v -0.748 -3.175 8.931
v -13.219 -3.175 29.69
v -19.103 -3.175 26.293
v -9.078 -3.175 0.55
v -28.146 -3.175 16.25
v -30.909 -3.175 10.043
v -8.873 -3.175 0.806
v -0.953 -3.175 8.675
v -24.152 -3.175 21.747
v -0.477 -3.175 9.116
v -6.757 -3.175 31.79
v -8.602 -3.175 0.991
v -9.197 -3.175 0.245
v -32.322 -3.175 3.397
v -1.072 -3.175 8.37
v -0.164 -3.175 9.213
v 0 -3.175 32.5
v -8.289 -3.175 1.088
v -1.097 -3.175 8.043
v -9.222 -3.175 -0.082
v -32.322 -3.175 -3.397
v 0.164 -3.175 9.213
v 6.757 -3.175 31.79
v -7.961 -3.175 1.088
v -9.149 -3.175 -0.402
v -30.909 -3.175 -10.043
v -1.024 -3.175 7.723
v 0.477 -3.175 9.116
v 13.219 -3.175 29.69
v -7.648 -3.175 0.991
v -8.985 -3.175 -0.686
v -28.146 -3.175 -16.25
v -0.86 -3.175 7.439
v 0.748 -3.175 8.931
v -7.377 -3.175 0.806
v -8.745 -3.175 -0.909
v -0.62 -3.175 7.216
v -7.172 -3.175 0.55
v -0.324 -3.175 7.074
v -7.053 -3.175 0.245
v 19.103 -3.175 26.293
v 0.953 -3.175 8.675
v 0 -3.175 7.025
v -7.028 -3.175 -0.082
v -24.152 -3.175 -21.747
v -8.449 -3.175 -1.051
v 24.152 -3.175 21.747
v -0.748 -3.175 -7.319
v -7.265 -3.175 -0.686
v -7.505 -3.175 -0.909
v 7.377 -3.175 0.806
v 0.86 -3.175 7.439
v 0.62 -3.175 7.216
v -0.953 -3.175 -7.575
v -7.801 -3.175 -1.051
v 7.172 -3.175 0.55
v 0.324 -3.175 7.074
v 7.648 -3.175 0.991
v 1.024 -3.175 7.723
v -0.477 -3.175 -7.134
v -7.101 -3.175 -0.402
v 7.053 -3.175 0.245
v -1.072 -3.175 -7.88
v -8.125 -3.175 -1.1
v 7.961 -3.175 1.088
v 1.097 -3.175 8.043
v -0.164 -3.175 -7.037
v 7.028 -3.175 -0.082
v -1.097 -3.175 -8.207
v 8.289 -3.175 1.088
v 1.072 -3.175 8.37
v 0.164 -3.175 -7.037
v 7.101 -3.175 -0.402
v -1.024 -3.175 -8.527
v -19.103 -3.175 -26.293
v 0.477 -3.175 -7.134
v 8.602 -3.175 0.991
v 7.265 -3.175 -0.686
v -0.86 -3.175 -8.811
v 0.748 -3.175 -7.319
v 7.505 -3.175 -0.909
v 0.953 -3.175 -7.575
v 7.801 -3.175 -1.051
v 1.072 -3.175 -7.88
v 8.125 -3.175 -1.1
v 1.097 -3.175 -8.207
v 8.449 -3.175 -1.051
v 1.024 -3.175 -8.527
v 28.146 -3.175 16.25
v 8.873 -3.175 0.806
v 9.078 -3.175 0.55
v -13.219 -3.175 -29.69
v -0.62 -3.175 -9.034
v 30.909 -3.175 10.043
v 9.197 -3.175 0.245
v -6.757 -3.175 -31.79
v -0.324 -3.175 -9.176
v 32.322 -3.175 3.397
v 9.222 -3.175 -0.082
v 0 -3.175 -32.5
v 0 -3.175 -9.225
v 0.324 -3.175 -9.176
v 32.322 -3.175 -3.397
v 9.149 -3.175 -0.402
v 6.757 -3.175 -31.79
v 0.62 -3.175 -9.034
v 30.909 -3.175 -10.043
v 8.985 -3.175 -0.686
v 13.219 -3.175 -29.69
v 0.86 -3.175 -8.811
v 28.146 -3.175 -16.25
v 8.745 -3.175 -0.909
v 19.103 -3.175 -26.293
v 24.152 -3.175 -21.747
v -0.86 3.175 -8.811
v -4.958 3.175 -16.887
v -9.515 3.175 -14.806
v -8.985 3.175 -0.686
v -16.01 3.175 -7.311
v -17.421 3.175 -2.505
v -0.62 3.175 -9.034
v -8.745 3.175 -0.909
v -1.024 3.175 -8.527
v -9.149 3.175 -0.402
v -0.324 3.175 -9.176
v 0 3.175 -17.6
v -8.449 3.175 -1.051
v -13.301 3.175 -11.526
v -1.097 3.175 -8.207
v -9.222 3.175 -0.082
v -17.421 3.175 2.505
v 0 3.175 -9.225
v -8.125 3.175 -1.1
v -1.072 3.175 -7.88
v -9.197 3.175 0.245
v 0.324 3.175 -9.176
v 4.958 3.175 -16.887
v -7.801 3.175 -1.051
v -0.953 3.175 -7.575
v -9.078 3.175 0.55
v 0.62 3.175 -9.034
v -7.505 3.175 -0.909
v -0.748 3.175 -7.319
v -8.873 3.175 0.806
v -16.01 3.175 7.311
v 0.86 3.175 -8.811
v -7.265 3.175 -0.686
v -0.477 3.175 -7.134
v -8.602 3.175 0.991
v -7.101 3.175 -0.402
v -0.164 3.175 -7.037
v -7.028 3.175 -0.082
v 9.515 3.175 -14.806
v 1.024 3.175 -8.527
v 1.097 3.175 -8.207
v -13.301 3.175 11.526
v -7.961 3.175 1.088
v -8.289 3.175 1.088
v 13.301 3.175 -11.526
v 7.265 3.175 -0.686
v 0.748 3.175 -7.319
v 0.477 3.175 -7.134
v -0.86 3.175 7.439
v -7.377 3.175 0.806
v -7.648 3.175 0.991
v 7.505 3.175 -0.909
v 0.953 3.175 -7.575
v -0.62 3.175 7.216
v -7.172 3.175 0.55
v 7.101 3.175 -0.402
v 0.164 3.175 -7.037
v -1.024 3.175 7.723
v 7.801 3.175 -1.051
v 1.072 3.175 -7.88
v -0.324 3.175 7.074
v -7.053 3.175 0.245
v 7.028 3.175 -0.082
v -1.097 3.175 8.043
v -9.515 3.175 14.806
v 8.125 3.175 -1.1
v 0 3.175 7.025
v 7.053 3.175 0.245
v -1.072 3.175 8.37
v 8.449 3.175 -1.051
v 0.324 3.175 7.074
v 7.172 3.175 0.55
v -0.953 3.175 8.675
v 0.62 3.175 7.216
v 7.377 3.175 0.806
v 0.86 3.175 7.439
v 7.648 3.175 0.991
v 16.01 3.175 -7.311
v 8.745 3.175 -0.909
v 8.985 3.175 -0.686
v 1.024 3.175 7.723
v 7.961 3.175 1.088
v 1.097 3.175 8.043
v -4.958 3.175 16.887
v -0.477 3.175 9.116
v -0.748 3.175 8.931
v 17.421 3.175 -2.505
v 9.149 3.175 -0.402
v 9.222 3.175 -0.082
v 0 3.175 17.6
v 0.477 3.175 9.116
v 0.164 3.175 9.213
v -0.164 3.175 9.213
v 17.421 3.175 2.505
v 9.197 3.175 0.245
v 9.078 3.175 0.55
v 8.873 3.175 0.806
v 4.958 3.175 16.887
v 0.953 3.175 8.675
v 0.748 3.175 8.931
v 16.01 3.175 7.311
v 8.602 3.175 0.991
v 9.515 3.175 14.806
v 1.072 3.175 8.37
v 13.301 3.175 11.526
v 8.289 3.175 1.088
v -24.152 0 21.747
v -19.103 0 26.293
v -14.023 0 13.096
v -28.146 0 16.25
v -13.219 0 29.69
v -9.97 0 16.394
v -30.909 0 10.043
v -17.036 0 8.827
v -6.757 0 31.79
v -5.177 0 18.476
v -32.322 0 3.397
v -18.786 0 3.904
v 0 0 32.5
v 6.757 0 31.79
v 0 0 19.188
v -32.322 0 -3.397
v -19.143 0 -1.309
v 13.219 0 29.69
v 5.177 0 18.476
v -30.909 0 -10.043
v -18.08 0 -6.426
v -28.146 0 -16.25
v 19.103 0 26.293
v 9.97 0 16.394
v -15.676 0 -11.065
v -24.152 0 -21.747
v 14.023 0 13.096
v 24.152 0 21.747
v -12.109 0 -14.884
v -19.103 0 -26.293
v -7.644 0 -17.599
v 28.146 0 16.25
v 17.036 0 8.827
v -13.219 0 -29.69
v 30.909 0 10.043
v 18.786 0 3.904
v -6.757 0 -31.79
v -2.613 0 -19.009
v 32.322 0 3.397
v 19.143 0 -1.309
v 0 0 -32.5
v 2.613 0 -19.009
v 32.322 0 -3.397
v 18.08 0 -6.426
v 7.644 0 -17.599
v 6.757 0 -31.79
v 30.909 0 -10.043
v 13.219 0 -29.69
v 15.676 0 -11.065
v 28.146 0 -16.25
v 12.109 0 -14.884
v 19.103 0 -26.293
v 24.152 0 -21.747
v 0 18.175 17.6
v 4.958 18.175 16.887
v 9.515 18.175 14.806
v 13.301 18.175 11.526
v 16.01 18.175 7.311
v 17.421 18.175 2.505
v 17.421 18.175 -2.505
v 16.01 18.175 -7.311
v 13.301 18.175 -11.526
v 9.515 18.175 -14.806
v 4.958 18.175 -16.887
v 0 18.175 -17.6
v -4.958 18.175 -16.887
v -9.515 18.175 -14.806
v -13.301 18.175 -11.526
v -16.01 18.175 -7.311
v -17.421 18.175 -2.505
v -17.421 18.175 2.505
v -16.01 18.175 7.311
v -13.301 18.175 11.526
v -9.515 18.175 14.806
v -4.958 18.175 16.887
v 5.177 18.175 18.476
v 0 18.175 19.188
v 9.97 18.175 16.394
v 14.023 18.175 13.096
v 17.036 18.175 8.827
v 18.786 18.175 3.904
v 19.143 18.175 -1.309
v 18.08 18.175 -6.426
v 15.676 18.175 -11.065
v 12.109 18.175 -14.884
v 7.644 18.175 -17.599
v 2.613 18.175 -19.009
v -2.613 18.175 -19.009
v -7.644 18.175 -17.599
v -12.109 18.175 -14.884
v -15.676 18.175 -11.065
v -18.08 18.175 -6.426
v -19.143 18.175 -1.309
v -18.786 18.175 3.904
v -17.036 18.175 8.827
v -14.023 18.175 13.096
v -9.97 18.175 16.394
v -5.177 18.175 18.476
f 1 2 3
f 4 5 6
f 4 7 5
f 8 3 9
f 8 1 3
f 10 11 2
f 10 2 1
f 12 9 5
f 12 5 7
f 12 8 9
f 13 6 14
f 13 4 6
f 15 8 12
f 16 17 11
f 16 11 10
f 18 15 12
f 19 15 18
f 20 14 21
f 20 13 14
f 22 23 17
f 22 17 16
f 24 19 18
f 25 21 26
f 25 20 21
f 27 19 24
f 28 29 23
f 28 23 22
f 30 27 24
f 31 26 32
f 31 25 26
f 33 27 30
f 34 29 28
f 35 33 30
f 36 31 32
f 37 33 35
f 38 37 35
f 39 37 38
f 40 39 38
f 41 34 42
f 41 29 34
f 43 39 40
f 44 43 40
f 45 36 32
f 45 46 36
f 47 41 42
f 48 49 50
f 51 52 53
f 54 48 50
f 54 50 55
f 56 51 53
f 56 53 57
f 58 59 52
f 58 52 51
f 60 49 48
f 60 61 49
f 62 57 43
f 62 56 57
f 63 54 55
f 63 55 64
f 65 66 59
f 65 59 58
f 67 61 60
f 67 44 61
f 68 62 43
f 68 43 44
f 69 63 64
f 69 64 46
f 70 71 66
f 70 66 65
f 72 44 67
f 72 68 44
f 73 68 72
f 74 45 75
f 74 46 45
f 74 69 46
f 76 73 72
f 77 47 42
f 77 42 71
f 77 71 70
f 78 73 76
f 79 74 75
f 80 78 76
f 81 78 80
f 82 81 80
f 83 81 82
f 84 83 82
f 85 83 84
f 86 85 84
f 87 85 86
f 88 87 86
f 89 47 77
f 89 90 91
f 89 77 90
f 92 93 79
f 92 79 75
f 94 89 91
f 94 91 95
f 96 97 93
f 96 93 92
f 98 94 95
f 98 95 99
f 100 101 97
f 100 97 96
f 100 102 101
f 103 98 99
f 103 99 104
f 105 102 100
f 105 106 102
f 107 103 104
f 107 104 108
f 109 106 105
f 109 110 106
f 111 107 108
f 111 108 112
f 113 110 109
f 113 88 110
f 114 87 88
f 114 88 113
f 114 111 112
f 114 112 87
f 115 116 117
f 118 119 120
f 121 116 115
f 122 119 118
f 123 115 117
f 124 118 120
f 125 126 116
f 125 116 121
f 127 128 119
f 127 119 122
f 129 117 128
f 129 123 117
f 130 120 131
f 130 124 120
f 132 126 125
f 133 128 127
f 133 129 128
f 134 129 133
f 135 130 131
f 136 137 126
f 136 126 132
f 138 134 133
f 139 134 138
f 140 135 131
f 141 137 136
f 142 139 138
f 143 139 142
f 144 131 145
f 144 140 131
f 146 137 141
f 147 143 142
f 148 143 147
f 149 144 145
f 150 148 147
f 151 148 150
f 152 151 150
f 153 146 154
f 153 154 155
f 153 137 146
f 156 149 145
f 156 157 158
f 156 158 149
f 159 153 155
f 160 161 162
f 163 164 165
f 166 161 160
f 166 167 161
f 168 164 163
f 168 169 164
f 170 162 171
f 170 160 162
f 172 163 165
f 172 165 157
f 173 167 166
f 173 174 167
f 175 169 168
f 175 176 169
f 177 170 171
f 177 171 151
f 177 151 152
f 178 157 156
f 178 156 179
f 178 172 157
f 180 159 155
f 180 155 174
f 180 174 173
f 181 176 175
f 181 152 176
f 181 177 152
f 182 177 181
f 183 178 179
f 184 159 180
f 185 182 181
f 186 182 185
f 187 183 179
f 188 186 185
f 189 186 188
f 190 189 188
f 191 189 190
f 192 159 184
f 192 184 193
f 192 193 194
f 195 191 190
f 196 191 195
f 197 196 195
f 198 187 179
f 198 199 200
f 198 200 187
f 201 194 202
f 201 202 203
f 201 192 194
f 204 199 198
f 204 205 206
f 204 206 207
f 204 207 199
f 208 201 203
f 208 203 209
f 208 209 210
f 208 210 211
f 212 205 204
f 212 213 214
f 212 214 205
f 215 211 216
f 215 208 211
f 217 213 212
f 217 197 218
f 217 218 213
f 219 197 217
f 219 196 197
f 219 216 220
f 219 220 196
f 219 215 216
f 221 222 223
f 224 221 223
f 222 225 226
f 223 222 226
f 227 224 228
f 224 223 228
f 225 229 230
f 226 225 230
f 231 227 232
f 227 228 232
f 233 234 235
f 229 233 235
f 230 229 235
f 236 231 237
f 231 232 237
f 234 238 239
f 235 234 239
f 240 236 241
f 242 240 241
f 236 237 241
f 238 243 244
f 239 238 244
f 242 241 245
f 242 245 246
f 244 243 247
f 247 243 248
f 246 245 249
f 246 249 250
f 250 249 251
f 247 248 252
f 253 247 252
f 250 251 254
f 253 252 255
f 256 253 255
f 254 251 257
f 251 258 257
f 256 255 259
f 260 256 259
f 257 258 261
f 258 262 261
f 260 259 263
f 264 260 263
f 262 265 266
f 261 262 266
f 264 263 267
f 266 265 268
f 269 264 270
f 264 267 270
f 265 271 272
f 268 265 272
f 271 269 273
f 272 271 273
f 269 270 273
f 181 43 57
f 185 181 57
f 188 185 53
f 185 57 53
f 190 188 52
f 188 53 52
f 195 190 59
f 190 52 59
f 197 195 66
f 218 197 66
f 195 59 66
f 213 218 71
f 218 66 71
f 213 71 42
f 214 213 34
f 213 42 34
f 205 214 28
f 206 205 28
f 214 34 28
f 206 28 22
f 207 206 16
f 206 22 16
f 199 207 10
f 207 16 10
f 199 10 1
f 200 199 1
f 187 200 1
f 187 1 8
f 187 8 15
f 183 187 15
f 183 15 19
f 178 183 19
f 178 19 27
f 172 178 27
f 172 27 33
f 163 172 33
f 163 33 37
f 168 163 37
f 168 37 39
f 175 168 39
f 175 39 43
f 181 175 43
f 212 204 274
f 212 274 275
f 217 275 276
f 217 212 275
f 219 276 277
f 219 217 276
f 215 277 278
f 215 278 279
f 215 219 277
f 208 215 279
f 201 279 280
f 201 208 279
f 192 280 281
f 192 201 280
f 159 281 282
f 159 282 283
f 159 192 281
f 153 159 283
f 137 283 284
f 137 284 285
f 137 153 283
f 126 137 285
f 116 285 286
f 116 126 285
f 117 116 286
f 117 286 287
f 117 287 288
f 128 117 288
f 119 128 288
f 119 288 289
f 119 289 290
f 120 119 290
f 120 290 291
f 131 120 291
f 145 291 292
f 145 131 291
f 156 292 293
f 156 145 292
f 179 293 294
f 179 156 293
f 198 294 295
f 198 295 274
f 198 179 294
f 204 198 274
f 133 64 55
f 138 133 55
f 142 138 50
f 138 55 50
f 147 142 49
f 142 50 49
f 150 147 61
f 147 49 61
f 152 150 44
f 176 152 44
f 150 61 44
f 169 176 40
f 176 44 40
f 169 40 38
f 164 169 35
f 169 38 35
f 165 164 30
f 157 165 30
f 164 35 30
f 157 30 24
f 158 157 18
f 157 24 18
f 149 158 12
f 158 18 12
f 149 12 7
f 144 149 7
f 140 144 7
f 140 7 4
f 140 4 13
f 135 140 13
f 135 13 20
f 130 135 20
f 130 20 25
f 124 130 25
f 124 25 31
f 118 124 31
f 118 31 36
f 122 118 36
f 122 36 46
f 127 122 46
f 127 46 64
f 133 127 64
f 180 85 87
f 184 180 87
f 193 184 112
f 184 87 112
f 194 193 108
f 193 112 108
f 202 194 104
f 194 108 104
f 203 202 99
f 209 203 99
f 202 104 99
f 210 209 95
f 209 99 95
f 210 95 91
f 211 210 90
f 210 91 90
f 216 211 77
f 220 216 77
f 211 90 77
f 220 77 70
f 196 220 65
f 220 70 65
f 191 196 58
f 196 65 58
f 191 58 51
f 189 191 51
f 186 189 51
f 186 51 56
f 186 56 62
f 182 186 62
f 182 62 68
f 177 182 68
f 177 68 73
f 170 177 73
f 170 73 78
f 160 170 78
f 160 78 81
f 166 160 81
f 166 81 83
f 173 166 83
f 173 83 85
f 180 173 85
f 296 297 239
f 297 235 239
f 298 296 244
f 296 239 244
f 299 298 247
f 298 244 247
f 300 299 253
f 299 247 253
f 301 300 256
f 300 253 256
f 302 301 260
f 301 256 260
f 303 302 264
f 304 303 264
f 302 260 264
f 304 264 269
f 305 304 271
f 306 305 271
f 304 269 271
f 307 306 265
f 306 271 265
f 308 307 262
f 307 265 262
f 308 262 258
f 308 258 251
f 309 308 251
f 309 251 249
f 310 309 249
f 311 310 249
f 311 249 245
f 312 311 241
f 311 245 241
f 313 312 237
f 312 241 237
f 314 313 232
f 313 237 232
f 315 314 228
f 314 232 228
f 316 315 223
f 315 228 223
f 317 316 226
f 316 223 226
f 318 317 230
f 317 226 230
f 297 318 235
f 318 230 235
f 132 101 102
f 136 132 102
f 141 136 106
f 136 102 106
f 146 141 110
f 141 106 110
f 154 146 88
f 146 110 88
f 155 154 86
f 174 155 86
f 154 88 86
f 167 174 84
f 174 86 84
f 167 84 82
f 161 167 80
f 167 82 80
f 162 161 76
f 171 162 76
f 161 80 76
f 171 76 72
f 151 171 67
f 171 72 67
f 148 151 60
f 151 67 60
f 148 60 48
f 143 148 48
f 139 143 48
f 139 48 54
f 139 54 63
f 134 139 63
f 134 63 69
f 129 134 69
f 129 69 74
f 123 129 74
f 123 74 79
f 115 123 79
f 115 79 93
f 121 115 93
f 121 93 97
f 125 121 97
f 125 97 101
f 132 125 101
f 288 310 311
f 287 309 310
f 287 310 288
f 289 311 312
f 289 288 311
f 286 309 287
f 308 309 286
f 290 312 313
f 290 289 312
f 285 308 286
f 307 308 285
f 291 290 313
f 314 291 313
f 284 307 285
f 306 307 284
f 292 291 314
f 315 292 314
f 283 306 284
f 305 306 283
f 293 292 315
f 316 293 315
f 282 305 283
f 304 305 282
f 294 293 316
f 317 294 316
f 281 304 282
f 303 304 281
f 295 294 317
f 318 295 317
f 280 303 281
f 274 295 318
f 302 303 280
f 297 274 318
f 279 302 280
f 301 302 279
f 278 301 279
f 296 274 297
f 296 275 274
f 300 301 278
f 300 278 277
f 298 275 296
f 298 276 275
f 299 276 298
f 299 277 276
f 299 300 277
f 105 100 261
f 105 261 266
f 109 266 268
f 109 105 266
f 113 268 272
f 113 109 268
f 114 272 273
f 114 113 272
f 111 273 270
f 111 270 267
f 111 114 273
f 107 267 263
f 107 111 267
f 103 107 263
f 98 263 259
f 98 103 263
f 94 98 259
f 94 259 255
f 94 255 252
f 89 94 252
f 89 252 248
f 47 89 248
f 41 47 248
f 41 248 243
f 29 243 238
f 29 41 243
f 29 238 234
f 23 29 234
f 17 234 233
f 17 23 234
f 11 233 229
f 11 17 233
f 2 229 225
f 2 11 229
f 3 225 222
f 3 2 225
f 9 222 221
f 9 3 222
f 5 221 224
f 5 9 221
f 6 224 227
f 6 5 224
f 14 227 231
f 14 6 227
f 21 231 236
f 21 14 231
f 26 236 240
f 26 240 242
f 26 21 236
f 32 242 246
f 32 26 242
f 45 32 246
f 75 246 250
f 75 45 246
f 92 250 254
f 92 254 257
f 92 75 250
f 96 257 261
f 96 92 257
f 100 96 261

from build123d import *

# Parameters (mm, degrees)
SKETCH1_R           = 19.1875
BOSS_EXTRUDE1_DEPTH = 3.175
SKETCH2_R           = 19.1875
SKETCH2_R_2         = 17.6
BOSS_EXTRUDE2_DEPTH = 15
SKETCH3_R           = 1.1
CUT_EXTRUDE1_DEPTH  = 33.659622434
BOSS_EXTRUDE3_START = 3.175
SKETCH4_R           = 32.5
SKETCH4_R_2         = 1.1
BOSS_EXTRUDE3_DEPTH = 3.175


with BuildPart() as part:
    # Sketch1 → Boss-Extrude1 (new body)
    with BuildSketch(Plane(origin=(0, 0, 0), x_dir=(1, 0, 0), z_dir=(0, 1, 0))):
        with Locations(Location((0, 0, 0), (0, 0, 270))):
            Circle(SKETCH1_R)
    extrude(amount=BOSS_EXTRUDE1_DEPTH)

    # Sketch2 → Boss-Extrude2 (add)
    with BuildSketch(Plane(origin=(0, 3.175, 0), x_dir=(1, 0, 0), z_dir=(0, 1, 0))):
        with Locations(Location((0, 0, 0), (0, 0, 270))):
            Circle(SKETCH2_R)
        with Locations(Location((0, 0, 0), (0, 0, 270))):
            Circle(SKETCH2_R_2, mode=Mode.SUBTRACT)
    extrude(amount=BOSS_EXTRUDE2_DEPTH)

    # Sketch3 → Cut-Extrude1 (cut, through all)
    with BuildSketch(Plane.XZ):
        with Locations(Location((0, 8.125, 0), (0, 0, 270))):
            Circle(SKETCH3_R)
        with Locations(Location((8.125, 0, 0), (0, 0, 270))):
            Circle(SKETCH3_R)
        with Locations(Location((-8.125, 0, 0), (0, 0, 270))):
            Circle(SKETCH3_R)
        with Locations(Location((0, -8.125, 0), (0, 0, 270))):
            Circle(SKETCH3_R)
    extrude(amount=-CUT_EXTRUDE1_DEPTH, mode=Mode.SUBTRACT)

    # Sketch4 → Boss-Extrude3 (add)
    with BuildSketch(Plane.XZ.offset(BOSS_EXTRUDE3_START)):
        with Locations(Location((0, 0, 0), (0, 0, 270))):
            Circle(SKETCH4_R)
        with Locations(Location((0, -8.125, 0), (0, 0, 270))):
            Circle(SKETCH4_R_2, mode=Mode.SUBTRACT)
        with Locations(Location((8.125, 0, 0), (0, 0, 270))):
            Circle(SKETCH4_R_2, mode=Mode.SUBTRACT)
        with Locations(Location((-8.125, 0, 0), (0, 0, 270))):
            Circle(SKETCH4_R_2, mode=Mode.SUBTRACT)
        with Locations(Location((0, 8.125, 0), (0, 0, 270))):
            Circle(SKETCH4_R_2, mode=Mode.SUBTRACT)
    extrude(amount=-BOSS_EXTRUDE3_DEPTH)


solid = part.part
